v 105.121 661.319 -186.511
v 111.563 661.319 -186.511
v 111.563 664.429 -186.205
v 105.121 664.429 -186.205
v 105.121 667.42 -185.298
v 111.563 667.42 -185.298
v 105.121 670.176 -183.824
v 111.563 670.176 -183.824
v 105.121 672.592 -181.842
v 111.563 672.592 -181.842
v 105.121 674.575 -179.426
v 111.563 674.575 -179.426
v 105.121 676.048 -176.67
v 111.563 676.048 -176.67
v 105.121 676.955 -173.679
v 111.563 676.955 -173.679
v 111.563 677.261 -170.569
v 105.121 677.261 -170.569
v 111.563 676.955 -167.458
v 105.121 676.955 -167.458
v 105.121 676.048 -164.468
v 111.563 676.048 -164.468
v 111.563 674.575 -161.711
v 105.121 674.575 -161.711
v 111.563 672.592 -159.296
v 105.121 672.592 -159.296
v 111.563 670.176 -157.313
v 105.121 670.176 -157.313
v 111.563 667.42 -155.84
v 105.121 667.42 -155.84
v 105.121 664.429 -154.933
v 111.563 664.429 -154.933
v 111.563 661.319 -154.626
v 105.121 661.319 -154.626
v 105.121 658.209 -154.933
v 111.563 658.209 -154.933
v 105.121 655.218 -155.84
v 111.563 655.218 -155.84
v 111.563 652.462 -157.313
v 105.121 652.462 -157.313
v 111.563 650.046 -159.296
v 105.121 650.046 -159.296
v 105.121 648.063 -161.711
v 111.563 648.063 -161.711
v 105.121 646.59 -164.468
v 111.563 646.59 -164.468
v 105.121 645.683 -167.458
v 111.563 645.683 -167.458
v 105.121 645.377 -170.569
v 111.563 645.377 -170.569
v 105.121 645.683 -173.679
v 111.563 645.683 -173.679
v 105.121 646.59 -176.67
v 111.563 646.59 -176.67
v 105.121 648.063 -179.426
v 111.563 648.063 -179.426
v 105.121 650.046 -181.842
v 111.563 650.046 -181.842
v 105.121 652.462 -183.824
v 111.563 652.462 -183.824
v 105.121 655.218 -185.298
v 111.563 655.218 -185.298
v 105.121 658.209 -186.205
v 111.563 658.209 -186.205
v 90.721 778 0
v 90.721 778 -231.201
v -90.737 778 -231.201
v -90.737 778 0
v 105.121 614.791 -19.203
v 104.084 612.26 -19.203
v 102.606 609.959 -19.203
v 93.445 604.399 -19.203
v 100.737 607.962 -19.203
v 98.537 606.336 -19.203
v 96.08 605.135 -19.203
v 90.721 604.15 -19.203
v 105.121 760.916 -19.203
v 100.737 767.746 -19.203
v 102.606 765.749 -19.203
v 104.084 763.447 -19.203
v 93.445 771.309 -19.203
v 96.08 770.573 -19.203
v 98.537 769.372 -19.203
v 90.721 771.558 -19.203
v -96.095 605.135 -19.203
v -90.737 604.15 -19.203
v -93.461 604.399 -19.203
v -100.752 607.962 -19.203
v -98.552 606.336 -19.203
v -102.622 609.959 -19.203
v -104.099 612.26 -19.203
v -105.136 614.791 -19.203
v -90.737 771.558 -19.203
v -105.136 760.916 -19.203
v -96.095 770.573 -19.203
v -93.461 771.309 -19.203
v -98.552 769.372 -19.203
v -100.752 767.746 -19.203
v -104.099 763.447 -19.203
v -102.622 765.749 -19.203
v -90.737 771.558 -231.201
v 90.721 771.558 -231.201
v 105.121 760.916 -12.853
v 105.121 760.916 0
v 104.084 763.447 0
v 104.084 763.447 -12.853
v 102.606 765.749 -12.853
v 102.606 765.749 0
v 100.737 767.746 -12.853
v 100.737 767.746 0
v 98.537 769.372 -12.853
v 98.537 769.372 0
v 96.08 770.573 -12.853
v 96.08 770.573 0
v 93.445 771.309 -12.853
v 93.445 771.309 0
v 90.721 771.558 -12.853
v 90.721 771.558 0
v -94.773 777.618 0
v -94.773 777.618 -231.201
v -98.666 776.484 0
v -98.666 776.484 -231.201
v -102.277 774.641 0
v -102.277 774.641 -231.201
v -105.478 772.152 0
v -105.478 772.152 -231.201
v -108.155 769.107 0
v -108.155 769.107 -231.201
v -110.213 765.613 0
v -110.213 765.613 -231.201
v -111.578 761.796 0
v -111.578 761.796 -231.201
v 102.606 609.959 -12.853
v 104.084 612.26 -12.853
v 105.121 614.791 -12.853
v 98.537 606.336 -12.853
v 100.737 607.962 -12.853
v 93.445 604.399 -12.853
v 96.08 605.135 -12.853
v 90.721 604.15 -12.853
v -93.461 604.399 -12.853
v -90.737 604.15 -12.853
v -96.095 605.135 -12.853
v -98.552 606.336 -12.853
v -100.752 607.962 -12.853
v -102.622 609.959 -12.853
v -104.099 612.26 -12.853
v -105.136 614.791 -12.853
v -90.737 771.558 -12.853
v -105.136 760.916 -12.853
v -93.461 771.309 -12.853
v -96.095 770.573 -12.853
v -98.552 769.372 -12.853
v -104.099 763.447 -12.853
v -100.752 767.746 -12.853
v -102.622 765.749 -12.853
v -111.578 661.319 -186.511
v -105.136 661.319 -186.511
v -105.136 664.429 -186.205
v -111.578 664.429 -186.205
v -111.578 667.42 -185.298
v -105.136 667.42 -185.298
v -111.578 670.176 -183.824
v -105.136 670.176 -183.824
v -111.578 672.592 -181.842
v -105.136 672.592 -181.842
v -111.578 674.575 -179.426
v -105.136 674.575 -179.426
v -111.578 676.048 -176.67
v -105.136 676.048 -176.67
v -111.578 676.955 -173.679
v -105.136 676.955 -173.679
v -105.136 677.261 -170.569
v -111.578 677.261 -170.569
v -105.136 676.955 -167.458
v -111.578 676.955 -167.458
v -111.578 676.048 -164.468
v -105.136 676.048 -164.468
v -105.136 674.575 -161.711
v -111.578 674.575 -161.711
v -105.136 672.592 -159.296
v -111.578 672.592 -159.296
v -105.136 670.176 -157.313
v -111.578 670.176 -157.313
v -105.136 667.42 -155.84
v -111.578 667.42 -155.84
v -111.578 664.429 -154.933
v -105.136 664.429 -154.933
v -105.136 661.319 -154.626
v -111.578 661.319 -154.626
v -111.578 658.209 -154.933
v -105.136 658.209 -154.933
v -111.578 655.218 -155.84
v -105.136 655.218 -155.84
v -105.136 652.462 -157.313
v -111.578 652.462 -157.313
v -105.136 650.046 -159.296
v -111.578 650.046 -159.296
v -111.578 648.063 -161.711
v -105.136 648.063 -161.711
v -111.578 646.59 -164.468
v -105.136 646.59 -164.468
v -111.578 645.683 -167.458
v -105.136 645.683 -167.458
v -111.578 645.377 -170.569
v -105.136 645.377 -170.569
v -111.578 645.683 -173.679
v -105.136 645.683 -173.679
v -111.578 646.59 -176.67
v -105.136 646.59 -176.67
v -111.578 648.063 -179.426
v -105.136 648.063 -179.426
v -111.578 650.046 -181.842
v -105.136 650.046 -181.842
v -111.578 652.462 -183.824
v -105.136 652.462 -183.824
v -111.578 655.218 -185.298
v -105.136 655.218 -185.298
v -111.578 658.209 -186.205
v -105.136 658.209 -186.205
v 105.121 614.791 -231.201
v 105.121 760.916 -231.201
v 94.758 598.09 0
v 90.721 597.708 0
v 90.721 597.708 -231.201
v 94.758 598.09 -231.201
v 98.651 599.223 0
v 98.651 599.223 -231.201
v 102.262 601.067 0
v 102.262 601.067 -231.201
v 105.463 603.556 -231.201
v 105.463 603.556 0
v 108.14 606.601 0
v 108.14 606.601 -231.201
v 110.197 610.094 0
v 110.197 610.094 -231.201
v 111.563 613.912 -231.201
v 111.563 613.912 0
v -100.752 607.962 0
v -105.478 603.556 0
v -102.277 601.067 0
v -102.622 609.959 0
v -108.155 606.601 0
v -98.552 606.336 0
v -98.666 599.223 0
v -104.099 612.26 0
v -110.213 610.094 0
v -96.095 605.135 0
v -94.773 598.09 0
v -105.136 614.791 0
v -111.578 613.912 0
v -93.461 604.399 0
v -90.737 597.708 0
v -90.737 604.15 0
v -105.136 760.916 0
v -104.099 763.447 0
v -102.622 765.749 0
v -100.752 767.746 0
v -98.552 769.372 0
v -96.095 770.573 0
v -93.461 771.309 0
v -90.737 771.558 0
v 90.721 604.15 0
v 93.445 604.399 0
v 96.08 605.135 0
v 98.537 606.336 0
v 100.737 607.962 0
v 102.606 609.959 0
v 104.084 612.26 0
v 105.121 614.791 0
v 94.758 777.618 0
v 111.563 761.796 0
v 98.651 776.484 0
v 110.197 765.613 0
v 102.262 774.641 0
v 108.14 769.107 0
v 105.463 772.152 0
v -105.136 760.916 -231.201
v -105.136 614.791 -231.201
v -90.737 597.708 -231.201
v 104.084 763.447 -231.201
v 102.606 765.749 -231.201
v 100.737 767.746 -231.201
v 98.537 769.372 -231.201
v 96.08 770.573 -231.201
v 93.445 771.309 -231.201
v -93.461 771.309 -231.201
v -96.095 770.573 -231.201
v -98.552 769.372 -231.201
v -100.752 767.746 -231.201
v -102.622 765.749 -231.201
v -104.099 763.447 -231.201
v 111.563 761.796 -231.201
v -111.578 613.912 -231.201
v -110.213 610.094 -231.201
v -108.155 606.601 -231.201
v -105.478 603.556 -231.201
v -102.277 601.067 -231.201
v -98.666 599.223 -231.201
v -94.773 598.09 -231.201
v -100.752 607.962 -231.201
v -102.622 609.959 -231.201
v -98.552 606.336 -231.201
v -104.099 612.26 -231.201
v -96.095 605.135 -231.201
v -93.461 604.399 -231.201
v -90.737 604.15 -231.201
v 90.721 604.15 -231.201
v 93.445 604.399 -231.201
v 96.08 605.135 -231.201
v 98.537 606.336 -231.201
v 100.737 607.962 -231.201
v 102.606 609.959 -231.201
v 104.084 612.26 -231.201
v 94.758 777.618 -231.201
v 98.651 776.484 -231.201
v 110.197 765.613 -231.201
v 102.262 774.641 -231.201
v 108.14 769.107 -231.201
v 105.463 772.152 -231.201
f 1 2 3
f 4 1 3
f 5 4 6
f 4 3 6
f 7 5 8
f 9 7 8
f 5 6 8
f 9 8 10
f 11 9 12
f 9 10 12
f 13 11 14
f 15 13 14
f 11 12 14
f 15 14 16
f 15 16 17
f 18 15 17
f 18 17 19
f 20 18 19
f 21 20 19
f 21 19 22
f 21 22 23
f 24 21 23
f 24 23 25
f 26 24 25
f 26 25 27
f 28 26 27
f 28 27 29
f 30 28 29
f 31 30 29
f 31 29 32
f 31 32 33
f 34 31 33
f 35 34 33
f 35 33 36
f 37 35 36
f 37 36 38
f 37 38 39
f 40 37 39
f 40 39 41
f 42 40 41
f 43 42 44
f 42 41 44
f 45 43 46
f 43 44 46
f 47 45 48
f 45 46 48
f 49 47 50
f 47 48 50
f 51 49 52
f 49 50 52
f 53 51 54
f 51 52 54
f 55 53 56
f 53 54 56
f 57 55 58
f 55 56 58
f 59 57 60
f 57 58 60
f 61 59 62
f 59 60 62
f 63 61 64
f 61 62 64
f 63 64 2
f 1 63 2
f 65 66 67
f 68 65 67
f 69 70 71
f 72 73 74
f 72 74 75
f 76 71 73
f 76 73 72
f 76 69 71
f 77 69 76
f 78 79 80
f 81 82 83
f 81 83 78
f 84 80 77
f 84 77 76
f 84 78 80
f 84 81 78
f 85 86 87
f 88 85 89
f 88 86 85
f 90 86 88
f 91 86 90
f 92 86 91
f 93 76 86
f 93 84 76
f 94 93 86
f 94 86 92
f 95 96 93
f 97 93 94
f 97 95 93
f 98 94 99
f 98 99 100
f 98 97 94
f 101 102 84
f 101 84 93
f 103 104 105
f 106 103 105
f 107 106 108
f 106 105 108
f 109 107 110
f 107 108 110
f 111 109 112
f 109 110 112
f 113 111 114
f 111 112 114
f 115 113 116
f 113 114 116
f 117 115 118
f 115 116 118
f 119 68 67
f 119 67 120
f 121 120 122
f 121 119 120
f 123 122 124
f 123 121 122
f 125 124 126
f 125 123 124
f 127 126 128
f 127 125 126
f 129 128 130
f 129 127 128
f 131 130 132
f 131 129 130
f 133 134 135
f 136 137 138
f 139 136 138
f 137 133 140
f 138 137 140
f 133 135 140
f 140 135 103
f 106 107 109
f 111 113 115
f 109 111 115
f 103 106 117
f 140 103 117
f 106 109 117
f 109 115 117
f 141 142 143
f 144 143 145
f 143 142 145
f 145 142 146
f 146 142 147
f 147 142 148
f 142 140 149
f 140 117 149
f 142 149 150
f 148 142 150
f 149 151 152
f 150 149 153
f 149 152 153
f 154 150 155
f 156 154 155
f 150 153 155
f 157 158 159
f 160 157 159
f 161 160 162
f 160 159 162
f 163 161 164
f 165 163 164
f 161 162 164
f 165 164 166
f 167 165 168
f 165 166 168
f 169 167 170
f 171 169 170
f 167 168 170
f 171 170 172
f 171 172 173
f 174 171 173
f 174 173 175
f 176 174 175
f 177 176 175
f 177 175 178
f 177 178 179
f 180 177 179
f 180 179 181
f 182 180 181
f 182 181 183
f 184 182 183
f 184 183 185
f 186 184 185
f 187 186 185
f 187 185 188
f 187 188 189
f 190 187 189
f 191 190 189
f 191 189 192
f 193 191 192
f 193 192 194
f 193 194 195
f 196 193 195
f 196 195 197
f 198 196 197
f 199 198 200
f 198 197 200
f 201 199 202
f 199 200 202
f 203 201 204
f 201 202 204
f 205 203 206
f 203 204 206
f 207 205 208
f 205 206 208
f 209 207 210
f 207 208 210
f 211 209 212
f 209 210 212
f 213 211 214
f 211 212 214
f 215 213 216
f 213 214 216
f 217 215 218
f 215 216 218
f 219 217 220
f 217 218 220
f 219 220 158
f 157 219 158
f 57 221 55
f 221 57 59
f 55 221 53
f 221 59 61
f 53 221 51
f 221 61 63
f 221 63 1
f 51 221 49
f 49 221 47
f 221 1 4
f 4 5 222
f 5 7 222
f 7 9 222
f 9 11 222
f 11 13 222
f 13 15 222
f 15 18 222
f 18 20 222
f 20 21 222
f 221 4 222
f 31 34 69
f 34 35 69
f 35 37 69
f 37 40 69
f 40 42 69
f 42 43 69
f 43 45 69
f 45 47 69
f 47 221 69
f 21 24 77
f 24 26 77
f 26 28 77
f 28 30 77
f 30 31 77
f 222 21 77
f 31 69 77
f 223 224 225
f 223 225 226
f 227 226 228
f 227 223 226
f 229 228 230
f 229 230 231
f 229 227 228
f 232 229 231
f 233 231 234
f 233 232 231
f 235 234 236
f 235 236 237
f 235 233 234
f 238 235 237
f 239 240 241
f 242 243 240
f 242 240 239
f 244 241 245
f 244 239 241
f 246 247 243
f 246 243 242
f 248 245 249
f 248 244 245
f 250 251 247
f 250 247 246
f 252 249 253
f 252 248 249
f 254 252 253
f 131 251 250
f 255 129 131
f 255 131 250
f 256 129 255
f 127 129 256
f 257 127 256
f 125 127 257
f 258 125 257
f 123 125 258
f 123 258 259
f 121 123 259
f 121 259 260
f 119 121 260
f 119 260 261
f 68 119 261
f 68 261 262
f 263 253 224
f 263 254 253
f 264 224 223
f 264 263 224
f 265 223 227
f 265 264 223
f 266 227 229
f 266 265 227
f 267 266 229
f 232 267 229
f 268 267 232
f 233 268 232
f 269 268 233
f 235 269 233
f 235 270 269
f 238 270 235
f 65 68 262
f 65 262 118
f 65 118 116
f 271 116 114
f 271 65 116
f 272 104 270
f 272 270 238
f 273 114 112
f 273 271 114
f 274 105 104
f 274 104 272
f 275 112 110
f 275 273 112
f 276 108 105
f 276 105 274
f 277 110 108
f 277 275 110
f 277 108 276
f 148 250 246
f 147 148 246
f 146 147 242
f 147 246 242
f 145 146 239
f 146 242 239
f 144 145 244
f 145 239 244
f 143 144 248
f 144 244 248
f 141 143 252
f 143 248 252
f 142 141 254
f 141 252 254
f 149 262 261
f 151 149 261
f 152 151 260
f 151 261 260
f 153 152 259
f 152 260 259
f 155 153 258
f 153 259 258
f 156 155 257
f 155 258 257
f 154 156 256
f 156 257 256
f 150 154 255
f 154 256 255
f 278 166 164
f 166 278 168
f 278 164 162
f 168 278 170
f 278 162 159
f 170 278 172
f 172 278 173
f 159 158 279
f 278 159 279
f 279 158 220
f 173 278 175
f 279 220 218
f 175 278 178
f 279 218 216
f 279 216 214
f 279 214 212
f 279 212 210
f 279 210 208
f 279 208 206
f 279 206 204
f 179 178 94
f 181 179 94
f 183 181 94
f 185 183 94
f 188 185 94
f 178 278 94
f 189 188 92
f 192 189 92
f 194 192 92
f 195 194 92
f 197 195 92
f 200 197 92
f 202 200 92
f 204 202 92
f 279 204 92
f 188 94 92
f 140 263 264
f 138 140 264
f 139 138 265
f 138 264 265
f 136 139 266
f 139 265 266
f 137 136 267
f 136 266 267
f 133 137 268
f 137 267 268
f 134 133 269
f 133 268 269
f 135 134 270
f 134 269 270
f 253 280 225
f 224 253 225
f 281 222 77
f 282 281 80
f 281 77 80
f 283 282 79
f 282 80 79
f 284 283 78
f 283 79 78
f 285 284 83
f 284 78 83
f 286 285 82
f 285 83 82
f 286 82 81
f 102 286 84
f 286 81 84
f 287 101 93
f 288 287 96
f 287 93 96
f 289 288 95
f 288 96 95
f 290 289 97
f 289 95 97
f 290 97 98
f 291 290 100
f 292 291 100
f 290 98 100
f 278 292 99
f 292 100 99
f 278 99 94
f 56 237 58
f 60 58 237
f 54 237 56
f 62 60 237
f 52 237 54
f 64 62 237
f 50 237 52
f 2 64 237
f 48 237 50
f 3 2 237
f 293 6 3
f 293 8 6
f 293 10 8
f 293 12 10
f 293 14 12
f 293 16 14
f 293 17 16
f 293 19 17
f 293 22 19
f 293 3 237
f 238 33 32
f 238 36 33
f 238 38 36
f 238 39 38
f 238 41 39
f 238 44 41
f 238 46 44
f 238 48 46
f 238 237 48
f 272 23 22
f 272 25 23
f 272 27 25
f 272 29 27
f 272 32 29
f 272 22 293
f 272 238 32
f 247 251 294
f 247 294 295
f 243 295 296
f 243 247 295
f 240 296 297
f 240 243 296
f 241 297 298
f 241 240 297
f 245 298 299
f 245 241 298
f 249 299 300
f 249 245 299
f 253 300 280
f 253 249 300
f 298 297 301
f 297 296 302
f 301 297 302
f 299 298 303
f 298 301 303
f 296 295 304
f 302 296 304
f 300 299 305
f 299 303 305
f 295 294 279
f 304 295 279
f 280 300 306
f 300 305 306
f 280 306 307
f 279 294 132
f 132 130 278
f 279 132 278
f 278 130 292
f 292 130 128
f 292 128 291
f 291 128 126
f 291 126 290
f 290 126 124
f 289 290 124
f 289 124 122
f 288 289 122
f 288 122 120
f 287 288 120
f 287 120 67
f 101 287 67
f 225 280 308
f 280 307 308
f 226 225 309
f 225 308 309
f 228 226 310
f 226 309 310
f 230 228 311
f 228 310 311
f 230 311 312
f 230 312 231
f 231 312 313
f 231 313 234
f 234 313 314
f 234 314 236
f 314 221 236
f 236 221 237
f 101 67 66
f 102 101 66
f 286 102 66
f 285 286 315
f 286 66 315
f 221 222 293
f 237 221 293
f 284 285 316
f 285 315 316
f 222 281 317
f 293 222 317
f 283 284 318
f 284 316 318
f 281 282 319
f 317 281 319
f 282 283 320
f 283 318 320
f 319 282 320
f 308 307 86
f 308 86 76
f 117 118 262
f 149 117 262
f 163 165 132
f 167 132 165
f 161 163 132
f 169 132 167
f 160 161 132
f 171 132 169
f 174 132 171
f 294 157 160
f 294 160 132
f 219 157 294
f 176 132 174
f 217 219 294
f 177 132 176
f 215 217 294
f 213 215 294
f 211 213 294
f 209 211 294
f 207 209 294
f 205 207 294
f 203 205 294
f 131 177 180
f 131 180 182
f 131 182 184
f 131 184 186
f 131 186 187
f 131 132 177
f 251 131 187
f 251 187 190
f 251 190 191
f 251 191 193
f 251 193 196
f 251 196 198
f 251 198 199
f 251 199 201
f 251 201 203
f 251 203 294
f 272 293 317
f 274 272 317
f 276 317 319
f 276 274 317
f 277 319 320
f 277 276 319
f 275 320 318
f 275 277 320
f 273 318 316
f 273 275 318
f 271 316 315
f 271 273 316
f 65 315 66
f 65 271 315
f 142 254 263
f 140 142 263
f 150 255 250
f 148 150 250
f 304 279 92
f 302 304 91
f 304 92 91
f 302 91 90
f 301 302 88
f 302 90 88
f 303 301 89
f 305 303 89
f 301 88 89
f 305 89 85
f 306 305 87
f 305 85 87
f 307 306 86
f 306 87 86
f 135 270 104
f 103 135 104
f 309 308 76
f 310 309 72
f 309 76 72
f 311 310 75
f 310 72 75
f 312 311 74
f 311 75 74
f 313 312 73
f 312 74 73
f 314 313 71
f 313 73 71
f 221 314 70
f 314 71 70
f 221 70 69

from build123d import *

# Parameters (mm, degrees)
BOSS_EXTRUDE1_DEPTH = 231.201214
BOSS_EXTRUDE2_START = -12.852654
BOSS_EXTRUDE2_DEPTH = 6.35
SKETCH3_R           = 15.942437
CUT_EXTRUDE1_DEPTH  = 842.74192987


with BuildPart() as part:
    # Sketch1 → Boss-Extrude1 (new body)
    with BuildSketch(Plane.XY):
        with BuildLine():
            Line((-90.736928, 597.708228), (90.721434, 597.708228))
            ThreePointArc((90.721434, 597.708228), (103.921108752, 602.235738137), (111.562896, 613.911904))
            Line((111.562896, 613.911904), (111.562896, 761.795784))
            ThreePointArc((111.562896, 761.795784), (103.921186704, 773.472121096), (90.721434, 777.999714))
            Line((90.721434, 777.999714), (-90.736928, 777.999714))
            ThreePointArc((-90.736928, 777.999714), (-103.936580442, 773.472111924), (-111.578136, 761.795784))
            Line((-111.578136, 761.795784), (-111.578136, 613.911904))
            ThreePointArc((-111.578136, 613.911904), (-103.936502489, 602.235747309), (-90.736928, 597.708228))
        make_face()
        with BuildLine():
            Line((-90.736928, 604.150176), (90.721434, 604.150176))
            ThreePointArc((90.721434, 604.150176), (99.673810429, 607.099124575), (105.120948, 614.791330612))
            Line((105.120948, 614.791330612), (105.120948, 760.91641141))
            ThreePointArc((105.120948, 760.91641141), (99.673869855, 768.60875328), (90.721434, 771.557766))
            Line((90.721434, 771.557766), (-90.736928, 771.557766))
            ThreePointArc((-90.736928, 771.557766), (-99.689249554, 768.60875822), (-105.136188, 760.916452346))
            Line((-105.136188, 760.916452346), (-105.136188, 614.791289676))
            ThreePointArc((-105.136188, 614.791289676), (-99.689190128, 607.099119635), (-90.736928, 604.150176))
        make_face(mode=Mode.SUBTRACT)
    extrude(amount=-BOSS_EXTRUDE1_DEPTH)

    # Sketch1<2> → Boss-Extrude2 (add)
    with BuildSketch(Plane.XY.offset(BOSS_EXTRUDE2_START)):
        with BuildLine():
            Line((90.721434, 771.557766), (-90.736928, 771.557766))
            ThreePointArc((-90.736928, 771.557766), (-99.689249554, 768.60875822), (-105.136188, 760.916452346))
            Line((-105.136188, 760.916452346), (-105.136188, 614.791289676))
            ThreePointArc((-105.136188, 614.791289676), (-99.689190128, 607.099119635), (-90.736928, 604.150176))
            Line((-90.736928, 604.150176), (90.721434, 604.150176))
            ThreePointArc((90.721434, 604.150176), (99.673810429, 607.099124575), (105.120948, 614.791330612))
            Line((105.120948, 614.791330612), (105.120948, 760.91641141))
            ThreePointArc((105.120948, 760.91641141), (99.673869855, 768.60875328), (90.721434, 771.557766))
        make_face()
    extrude(amount=-BOSS_EXTRUDE2_DEPTH)

    # Sketch3 → Cut-Extrude1 (cut, through all)
    with BuildSketch(Plane(origin=(111.562896, 0, 0), x_dir=(0, 0, -1), z_dir=(1, 0, 0))):
        with Locations((170.56862, 661.318972)):
            Circle(SKETCH3_R)
    extrude(amount=-CUT_EXTRUDE1_DEPTH, mode=Mode.SUBTRACT)


solid = part.part
